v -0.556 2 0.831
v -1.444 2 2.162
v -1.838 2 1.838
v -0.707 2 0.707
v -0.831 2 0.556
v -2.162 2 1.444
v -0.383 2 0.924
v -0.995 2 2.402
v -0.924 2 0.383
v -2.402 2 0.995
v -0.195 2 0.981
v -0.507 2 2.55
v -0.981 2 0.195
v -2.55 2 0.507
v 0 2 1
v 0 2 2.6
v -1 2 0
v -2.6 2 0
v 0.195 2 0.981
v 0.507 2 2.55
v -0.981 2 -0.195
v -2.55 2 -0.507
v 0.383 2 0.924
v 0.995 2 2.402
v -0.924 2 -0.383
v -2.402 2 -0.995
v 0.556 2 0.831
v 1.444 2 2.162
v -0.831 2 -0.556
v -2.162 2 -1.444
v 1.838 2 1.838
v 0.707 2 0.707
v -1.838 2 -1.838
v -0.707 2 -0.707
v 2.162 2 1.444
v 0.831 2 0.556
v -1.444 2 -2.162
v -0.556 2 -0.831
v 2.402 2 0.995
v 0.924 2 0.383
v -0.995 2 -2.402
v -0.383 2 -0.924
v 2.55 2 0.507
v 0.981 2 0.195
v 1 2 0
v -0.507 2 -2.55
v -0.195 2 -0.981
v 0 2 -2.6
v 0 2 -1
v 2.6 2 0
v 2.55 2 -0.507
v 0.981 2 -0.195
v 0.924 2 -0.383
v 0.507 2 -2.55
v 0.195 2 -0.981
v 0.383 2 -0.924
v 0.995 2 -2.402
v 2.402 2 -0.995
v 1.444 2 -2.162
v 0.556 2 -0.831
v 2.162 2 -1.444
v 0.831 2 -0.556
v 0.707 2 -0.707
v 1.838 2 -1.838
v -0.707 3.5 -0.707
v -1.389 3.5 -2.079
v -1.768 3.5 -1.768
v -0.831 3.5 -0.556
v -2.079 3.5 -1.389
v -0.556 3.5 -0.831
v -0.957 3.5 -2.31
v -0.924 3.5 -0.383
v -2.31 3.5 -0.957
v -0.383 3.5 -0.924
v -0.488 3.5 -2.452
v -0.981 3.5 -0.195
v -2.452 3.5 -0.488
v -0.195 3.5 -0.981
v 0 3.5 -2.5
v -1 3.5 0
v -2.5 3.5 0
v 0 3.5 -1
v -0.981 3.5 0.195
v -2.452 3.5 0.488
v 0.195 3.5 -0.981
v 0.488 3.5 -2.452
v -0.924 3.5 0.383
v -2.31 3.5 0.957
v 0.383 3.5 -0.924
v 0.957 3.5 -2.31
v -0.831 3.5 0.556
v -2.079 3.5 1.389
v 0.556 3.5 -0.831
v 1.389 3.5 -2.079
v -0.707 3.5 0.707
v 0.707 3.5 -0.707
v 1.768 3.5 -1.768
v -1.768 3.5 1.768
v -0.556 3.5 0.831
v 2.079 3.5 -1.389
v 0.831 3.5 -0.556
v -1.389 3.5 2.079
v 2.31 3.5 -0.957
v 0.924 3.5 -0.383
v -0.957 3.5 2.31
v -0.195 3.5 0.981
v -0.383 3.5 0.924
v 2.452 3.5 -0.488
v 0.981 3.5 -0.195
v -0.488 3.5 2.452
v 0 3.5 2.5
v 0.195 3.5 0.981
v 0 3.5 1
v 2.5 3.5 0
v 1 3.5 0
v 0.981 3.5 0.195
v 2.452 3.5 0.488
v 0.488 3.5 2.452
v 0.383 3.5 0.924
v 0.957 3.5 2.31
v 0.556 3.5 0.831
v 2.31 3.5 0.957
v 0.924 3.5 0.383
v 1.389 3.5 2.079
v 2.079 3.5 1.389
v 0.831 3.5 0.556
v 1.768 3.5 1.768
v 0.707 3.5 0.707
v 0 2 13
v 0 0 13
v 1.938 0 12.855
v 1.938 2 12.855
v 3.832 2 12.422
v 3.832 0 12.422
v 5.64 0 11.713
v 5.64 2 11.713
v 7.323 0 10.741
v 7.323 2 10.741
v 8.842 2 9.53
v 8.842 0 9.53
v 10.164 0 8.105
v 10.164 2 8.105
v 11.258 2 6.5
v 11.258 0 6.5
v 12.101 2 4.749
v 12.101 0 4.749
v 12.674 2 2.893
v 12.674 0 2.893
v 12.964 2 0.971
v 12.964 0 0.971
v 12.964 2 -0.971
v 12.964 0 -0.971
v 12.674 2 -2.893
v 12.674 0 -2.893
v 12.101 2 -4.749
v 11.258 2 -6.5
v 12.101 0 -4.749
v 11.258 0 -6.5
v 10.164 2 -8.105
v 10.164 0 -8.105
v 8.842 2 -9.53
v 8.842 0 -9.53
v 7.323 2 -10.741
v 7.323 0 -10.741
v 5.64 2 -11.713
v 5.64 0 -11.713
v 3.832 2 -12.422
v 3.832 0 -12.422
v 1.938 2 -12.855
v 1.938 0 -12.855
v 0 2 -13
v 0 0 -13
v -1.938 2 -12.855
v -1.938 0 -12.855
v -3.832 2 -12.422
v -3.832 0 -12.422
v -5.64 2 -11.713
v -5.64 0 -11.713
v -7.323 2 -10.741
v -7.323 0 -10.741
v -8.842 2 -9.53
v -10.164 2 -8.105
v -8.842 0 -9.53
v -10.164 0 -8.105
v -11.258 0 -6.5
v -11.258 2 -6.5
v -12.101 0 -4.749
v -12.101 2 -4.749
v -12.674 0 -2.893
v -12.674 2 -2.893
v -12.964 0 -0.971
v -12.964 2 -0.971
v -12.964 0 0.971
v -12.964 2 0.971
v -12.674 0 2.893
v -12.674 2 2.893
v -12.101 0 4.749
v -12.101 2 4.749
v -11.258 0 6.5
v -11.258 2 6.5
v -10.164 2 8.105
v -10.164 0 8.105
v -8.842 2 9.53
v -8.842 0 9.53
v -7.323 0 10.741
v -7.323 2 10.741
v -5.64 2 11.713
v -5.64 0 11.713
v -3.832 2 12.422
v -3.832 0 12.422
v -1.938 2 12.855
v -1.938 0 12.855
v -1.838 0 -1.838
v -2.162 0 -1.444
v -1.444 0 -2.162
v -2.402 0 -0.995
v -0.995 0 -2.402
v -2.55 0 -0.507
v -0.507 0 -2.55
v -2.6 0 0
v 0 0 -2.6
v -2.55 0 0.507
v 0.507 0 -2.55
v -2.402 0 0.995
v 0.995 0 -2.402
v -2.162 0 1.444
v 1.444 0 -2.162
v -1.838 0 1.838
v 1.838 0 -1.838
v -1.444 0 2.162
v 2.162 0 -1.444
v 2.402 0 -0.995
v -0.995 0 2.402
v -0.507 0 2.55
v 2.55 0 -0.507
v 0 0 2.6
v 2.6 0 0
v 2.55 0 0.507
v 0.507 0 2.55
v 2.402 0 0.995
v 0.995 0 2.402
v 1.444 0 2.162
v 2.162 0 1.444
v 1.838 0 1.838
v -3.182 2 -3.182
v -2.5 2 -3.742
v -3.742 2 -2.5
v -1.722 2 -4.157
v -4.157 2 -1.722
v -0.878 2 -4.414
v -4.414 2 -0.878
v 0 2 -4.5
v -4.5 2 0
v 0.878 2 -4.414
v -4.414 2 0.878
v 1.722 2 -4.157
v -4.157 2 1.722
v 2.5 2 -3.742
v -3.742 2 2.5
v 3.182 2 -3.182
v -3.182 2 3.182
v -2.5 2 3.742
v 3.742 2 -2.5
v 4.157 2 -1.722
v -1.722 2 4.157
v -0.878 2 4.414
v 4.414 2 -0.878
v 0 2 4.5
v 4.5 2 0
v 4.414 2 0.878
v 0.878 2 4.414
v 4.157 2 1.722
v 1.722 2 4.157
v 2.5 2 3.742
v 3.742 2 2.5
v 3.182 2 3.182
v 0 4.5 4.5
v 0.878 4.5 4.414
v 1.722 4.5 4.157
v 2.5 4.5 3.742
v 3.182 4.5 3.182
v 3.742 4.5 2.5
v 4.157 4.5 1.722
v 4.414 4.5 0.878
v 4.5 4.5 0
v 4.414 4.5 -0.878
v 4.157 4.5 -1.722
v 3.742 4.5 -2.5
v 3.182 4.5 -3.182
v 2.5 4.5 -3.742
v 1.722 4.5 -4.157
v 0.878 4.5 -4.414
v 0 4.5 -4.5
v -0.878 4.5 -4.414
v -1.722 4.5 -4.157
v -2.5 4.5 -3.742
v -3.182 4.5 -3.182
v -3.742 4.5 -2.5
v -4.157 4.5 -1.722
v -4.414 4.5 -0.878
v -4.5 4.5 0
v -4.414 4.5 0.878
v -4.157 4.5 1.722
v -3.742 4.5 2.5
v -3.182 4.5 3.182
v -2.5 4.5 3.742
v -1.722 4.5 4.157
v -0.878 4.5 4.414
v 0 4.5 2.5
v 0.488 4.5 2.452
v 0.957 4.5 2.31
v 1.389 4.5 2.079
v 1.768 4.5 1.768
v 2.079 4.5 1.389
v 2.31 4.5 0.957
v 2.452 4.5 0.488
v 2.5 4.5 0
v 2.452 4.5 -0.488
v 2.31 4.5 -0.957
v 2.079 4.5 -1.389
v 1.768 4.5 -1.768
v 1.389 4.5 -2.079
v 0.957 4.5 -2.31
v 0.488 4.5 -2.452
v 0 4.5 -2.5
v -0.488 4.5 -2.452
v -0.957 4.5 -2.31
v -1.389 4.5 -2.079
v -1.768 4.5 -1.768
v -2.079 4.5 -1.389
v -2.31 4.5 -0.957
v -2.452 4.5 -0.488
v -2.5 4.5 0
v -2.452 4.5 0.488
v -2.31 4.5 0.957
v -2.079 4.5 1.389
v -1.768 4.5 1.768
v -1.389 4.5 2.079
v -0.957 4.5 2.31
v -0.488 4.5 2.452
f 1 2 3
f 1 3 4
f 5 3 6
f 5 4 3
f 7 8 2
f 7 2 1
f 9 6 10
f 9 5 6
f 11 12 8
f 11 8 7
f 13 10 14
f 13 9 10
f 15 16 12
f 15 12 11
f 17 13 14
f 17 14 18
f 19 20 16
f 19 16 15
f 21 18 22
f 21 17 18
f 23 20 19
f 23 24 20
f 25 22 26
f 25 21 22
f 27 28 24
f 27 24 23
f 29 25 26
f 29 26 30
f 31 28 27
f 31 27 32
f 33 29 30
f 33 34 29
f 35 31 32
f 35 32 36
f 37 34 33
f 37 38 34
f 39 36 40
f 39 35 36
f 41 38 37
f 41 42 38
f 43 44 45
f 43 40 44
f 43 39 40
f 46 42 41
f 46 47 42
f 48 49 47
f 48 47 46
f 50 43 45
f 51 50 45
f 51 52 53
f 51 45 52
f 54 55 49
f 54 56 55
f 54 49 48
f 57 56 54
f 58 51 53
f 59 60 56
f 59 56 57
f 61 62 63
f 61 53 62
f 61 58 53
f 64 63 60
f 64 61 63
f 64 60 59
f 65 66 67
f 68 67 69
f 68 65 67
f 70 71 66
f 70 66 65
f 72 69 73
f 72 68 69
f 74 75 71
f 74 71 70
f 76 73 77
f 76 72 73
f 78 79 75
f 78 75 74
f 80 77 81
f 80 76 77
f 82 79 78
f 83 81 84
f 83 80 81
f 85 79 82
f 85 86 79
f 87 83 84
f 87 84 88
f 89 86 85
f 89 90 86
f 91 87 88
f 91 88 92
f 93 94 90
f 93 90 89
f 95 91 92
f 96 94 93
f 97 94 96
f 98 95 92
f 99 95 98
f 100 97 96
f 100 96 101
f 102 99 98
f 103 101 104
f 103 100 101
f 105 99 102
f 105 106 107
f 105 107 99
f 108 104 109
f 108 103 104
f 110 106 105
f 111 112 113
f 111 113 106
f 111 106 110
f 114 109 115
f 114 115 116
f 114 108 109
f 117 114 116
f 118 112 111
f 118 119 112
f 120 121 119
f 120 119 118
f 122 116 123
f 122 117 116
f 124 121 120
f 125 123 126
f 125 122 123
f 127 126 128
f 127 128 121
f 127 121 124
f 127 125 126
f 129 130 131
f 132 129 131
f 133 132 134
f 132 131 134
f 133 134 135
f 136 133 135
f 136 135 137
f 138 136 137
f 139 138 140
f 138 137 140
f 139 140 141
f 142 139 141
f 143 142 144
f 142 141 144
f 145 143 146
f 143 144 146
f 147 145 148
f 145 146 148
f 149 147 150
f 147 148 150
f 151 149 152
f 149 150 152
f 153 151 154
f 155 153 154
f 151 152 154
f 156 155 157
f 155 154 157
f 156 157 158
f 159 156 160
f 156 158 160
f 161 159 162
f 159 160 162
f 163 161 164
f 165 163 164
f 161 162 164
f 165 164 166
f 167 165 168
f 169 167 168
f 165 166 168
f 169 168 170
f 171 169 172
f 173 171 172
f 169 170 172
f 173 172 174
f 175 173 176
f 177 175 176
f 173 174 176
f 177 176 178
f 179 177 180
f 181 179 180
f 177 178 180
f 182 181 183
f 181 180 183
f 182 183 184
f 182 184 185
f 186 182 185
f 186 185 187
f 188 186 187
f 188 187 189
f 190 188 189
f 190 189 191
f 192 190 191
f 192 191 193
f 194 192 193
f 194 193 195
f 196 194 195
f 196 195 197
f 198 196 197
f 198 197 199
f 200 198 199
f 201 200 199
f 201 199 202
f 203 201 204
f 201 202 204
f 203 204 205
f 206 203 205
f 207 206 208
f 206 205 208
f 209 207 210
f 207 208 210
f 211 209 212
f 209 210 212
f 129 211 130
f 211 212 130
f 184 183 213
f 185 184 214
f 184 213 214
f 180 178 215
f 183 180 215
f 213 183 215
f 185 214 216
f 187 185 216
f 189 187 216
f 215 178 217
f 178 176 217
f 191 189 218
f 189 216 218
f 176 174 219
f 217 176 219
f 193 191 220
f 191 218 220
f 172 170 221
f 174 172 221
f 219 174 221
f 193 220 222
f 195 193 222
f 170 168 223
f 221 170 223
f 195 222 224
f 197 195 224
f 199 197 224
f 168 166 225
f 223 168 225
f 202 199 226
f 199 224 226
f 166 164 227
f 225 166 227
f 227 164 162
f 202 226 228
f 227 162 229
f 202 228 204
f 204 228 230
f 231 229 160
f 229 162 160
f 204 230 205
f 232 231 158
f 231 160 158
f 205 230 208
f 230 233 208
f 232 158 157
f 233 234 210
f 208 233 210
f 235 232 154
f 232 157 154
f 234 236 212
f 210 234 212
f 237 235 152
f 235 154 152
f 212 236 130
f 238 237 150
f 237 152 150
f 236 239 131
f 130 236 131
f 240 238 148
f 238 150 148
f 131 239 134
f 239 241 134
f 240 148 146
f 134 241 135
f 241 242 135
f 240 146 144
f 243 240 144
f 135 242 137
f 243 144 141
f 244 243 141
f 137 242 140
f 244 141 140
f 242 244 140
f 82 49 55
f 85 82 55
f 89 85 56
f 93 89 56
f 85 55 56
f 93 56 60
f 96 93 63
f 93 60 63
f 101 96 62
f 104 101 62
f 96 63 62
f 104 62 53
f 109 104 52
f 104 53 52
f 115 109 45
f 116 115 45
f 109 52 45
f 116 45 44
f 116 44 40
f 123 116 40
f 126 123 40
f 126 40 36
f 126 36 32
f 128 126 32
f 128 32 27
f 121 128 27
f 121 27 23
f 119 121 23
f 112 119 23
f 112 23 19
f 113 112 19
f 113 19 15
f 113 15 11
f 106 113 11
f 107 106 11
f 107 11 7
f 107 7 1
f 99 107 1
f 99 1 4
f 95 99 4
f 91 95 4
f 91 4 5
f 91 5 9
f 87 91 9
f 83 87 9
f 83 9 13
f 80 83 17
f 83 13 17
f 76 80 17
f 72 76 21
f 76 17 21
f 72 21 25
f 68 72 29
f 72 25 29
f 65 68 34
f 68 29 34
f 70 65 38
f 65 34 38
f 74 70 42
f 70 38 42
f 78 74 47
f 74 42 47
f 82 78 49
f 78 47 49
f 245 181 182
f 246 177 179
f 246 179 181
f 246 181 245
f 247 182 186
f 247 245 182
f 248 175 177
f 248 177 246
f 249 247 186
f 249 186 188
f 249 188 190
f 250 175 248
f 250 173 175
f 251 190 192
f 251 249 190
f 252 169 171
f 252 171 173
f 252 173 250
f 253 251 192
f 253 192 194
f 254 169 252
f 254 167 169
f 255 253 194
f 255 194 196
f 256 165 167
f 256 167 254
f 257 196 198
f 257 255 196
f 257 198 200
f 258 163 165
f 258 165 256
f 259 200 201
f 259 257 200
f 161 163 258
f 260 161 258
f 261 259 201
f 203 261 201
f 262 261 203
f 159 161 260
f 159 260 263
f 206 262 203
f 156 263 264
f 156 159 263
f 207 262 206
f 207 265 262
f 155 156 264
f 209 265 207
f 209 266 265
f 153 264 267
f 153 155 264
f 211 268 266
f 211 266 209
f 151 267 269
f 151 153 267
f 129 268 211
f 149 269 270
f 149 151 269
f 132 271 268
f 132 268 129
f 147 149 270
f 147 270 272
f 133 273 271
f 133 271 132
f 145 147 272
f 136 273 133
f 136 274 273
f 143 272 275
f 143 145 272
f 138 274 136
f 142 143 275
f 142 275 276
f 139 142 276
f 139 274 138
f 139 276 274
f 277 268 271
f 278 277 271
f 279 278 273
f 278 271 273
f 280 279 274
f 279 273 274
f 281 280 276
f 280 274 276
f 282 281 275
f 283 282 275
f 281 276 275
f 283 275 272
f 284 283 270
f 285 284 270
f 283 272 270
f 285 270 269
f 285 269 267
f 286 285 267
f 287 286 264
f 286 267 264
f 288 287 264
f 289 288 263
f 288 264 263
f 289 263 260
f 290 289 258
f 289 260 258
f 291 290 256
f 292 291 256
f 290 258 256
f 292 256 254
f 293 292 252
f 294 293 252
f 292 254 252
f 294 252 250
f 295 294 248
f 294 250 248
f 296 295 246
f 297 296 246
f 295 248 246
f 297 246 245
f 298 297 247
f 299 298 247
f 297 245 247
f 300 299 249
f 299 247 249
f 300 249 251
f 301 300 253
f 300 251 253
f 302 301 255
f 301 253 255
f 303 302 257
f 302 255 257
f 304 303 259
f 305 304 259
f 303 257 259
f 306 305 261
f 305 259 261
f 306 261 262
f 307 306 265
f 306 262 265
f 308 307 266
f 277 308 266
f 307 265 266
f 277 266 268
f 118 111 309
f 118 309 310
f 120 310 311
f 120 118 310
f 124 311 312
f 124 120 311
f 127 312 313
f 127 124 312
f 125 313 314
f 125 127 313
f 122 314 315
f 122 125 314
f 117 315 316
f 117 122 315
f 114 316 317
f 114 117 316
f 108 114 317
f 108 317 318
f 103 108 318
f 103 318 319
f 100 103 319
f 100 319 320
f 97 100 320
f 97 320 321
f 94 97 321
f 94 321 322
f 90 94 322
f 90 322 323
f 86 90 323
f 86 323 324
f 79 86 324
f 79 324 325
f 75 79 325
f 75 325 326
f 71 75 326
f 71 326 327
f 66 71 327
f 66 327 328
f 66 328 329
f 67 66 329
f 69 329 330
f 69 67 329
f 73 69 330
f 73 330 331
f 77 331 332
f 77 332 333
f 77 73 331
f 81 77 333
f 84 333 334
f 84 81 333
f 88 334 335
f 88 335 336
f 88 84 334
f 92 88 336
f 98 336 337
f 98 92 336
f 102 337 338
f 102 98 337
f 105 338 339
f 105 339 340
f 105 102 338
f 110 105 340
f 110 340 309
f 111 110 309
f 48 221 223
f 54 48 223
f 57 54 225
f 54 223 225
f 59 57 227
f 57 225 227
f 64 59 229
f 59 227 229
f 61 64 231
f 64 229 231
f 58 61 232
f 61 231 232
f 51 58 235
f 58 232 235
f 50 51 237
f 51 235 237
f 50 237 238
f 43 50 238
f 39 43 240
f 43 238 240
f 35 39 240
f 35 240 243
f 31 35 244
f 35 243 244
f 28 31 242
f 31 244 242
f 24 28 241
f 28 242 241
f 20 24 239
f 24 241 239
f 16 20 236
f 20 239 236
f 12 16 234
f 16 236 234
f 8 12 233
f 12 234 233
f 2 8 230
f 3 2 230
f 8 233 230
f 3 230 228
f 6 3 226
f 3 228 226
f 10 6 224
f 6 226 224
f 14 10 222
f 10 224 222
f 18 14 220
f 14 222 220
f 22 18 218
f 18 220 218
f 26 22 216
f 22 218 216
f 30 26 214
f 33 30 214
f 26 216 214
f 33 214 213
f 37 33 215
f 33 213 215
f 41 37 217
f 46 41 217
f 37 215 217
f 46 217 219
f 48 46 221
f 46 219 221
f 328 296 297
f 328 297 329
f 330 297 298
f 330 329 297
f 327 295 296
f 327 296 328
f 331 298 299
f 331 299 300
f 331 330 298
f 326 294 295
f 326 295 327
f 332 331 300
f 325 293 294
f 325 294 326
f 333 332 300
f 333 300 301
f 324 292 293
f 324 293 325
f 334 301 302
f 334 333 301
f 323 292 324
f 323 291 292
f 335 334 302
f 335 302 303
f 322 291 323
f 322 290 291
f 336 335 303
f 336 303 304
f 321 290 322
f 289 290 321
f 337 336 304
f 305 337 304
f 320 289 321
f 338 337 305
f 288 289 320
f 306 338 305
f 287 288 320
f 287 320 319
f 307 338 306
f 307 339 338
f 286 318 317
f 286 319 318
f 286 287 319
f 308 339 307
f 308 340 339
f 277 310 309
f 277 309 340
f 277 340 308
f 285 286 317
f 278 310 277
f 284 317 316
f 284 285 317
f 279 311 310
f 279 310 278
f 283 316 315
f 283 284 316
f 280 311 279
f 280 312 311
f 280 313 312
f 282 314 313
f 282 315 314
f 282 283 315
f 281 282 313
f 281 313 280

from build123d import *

# Parameters (mm, degrees)
SKETCH_2_R          = 13
EXTRUDE_1_DEPTH     = 2
SKETCH_3_R          = 4.5
SKETCH_3_R_2        = 2.5
EXTRUDE_2_DEPTH     = 2.5
SKETCH_4_R          = 2.5
EXTRUDE_3_DEPTH     = 1.5
SKETCH_5_R          = 2.6
CUT_EXTRUDE_1_DEPTH = 2
SKETCH_6_R          = 1
CUT_EXTRUDE_2_DEPTH = 2


with BuildPart() as part:
    # 草图2 → 凸台-拉伸1 (new body)
    with BuildSketch(Plane(origin=(0, 0, 0), x_dir=(1, 0, 0), z_dir=(0, 1, 0))):
        with Locations(Location((0, 0, 0), (0, 0, 270))):
            Circle(SKETCH_2_R)
    extrude(amount=EXTRUDE_1_DEPTH)

    # 草图3 → 凸台-拉伸2 (add)
    with BuildSketch(Plane(origin=(0, 2, 0), x_dir=(1, 0, 0), z_dir=(0, 1, 0))):
        with Locations(Location((0, 0, 0), (0, 0, 270))):
            Circle(SKETCH_3_R)
        with Locations(Location((0, 0, 0), (0, 0, 270))):
            Circle(SKETCH_3_R_2, mode=Mode.SUBTRACT)
    extrude(amount=EXTRUDE_2_DEPTH)

    # 草图4 → 凸台-拉伸3 (add)
    with BuildSketch(Plane(origin=(0, 2, 0), x_dir=(1, 0, 0), z_dir=(0, 1, 0))):
        with Locations(Location((0, 0, 0), (0, 0, 270))):
            Circle(SKETCH_4_R)
    extrude(amount=EXTRUDE_3_DEPTH)

    # 草图5 → 切除-拉伸1 (cut)
    with BuildSketch(Plane.XZ):
        with Locations(Location((0, 0, 0), (0, 0, 270))):
            Circle(SKETCH_5_R)
    extrude(amount=-CUT_EXTRUDE_1_DEPTH, mode=Mode.SUBTRACT)

    # 草图6 → 切除-拉伸2 (cut)
    with BuildSketch(Plane.XZ.offset(-2)):
        with Locations(Location((0, 0, 0), (0, 0, 270))):
            Circle(SKETCH_6_R)
    extrude(amount=-CUT_EXTRUDE_2_DEPTH, mode=Mode.SUBTRACT)


solid = part.part
